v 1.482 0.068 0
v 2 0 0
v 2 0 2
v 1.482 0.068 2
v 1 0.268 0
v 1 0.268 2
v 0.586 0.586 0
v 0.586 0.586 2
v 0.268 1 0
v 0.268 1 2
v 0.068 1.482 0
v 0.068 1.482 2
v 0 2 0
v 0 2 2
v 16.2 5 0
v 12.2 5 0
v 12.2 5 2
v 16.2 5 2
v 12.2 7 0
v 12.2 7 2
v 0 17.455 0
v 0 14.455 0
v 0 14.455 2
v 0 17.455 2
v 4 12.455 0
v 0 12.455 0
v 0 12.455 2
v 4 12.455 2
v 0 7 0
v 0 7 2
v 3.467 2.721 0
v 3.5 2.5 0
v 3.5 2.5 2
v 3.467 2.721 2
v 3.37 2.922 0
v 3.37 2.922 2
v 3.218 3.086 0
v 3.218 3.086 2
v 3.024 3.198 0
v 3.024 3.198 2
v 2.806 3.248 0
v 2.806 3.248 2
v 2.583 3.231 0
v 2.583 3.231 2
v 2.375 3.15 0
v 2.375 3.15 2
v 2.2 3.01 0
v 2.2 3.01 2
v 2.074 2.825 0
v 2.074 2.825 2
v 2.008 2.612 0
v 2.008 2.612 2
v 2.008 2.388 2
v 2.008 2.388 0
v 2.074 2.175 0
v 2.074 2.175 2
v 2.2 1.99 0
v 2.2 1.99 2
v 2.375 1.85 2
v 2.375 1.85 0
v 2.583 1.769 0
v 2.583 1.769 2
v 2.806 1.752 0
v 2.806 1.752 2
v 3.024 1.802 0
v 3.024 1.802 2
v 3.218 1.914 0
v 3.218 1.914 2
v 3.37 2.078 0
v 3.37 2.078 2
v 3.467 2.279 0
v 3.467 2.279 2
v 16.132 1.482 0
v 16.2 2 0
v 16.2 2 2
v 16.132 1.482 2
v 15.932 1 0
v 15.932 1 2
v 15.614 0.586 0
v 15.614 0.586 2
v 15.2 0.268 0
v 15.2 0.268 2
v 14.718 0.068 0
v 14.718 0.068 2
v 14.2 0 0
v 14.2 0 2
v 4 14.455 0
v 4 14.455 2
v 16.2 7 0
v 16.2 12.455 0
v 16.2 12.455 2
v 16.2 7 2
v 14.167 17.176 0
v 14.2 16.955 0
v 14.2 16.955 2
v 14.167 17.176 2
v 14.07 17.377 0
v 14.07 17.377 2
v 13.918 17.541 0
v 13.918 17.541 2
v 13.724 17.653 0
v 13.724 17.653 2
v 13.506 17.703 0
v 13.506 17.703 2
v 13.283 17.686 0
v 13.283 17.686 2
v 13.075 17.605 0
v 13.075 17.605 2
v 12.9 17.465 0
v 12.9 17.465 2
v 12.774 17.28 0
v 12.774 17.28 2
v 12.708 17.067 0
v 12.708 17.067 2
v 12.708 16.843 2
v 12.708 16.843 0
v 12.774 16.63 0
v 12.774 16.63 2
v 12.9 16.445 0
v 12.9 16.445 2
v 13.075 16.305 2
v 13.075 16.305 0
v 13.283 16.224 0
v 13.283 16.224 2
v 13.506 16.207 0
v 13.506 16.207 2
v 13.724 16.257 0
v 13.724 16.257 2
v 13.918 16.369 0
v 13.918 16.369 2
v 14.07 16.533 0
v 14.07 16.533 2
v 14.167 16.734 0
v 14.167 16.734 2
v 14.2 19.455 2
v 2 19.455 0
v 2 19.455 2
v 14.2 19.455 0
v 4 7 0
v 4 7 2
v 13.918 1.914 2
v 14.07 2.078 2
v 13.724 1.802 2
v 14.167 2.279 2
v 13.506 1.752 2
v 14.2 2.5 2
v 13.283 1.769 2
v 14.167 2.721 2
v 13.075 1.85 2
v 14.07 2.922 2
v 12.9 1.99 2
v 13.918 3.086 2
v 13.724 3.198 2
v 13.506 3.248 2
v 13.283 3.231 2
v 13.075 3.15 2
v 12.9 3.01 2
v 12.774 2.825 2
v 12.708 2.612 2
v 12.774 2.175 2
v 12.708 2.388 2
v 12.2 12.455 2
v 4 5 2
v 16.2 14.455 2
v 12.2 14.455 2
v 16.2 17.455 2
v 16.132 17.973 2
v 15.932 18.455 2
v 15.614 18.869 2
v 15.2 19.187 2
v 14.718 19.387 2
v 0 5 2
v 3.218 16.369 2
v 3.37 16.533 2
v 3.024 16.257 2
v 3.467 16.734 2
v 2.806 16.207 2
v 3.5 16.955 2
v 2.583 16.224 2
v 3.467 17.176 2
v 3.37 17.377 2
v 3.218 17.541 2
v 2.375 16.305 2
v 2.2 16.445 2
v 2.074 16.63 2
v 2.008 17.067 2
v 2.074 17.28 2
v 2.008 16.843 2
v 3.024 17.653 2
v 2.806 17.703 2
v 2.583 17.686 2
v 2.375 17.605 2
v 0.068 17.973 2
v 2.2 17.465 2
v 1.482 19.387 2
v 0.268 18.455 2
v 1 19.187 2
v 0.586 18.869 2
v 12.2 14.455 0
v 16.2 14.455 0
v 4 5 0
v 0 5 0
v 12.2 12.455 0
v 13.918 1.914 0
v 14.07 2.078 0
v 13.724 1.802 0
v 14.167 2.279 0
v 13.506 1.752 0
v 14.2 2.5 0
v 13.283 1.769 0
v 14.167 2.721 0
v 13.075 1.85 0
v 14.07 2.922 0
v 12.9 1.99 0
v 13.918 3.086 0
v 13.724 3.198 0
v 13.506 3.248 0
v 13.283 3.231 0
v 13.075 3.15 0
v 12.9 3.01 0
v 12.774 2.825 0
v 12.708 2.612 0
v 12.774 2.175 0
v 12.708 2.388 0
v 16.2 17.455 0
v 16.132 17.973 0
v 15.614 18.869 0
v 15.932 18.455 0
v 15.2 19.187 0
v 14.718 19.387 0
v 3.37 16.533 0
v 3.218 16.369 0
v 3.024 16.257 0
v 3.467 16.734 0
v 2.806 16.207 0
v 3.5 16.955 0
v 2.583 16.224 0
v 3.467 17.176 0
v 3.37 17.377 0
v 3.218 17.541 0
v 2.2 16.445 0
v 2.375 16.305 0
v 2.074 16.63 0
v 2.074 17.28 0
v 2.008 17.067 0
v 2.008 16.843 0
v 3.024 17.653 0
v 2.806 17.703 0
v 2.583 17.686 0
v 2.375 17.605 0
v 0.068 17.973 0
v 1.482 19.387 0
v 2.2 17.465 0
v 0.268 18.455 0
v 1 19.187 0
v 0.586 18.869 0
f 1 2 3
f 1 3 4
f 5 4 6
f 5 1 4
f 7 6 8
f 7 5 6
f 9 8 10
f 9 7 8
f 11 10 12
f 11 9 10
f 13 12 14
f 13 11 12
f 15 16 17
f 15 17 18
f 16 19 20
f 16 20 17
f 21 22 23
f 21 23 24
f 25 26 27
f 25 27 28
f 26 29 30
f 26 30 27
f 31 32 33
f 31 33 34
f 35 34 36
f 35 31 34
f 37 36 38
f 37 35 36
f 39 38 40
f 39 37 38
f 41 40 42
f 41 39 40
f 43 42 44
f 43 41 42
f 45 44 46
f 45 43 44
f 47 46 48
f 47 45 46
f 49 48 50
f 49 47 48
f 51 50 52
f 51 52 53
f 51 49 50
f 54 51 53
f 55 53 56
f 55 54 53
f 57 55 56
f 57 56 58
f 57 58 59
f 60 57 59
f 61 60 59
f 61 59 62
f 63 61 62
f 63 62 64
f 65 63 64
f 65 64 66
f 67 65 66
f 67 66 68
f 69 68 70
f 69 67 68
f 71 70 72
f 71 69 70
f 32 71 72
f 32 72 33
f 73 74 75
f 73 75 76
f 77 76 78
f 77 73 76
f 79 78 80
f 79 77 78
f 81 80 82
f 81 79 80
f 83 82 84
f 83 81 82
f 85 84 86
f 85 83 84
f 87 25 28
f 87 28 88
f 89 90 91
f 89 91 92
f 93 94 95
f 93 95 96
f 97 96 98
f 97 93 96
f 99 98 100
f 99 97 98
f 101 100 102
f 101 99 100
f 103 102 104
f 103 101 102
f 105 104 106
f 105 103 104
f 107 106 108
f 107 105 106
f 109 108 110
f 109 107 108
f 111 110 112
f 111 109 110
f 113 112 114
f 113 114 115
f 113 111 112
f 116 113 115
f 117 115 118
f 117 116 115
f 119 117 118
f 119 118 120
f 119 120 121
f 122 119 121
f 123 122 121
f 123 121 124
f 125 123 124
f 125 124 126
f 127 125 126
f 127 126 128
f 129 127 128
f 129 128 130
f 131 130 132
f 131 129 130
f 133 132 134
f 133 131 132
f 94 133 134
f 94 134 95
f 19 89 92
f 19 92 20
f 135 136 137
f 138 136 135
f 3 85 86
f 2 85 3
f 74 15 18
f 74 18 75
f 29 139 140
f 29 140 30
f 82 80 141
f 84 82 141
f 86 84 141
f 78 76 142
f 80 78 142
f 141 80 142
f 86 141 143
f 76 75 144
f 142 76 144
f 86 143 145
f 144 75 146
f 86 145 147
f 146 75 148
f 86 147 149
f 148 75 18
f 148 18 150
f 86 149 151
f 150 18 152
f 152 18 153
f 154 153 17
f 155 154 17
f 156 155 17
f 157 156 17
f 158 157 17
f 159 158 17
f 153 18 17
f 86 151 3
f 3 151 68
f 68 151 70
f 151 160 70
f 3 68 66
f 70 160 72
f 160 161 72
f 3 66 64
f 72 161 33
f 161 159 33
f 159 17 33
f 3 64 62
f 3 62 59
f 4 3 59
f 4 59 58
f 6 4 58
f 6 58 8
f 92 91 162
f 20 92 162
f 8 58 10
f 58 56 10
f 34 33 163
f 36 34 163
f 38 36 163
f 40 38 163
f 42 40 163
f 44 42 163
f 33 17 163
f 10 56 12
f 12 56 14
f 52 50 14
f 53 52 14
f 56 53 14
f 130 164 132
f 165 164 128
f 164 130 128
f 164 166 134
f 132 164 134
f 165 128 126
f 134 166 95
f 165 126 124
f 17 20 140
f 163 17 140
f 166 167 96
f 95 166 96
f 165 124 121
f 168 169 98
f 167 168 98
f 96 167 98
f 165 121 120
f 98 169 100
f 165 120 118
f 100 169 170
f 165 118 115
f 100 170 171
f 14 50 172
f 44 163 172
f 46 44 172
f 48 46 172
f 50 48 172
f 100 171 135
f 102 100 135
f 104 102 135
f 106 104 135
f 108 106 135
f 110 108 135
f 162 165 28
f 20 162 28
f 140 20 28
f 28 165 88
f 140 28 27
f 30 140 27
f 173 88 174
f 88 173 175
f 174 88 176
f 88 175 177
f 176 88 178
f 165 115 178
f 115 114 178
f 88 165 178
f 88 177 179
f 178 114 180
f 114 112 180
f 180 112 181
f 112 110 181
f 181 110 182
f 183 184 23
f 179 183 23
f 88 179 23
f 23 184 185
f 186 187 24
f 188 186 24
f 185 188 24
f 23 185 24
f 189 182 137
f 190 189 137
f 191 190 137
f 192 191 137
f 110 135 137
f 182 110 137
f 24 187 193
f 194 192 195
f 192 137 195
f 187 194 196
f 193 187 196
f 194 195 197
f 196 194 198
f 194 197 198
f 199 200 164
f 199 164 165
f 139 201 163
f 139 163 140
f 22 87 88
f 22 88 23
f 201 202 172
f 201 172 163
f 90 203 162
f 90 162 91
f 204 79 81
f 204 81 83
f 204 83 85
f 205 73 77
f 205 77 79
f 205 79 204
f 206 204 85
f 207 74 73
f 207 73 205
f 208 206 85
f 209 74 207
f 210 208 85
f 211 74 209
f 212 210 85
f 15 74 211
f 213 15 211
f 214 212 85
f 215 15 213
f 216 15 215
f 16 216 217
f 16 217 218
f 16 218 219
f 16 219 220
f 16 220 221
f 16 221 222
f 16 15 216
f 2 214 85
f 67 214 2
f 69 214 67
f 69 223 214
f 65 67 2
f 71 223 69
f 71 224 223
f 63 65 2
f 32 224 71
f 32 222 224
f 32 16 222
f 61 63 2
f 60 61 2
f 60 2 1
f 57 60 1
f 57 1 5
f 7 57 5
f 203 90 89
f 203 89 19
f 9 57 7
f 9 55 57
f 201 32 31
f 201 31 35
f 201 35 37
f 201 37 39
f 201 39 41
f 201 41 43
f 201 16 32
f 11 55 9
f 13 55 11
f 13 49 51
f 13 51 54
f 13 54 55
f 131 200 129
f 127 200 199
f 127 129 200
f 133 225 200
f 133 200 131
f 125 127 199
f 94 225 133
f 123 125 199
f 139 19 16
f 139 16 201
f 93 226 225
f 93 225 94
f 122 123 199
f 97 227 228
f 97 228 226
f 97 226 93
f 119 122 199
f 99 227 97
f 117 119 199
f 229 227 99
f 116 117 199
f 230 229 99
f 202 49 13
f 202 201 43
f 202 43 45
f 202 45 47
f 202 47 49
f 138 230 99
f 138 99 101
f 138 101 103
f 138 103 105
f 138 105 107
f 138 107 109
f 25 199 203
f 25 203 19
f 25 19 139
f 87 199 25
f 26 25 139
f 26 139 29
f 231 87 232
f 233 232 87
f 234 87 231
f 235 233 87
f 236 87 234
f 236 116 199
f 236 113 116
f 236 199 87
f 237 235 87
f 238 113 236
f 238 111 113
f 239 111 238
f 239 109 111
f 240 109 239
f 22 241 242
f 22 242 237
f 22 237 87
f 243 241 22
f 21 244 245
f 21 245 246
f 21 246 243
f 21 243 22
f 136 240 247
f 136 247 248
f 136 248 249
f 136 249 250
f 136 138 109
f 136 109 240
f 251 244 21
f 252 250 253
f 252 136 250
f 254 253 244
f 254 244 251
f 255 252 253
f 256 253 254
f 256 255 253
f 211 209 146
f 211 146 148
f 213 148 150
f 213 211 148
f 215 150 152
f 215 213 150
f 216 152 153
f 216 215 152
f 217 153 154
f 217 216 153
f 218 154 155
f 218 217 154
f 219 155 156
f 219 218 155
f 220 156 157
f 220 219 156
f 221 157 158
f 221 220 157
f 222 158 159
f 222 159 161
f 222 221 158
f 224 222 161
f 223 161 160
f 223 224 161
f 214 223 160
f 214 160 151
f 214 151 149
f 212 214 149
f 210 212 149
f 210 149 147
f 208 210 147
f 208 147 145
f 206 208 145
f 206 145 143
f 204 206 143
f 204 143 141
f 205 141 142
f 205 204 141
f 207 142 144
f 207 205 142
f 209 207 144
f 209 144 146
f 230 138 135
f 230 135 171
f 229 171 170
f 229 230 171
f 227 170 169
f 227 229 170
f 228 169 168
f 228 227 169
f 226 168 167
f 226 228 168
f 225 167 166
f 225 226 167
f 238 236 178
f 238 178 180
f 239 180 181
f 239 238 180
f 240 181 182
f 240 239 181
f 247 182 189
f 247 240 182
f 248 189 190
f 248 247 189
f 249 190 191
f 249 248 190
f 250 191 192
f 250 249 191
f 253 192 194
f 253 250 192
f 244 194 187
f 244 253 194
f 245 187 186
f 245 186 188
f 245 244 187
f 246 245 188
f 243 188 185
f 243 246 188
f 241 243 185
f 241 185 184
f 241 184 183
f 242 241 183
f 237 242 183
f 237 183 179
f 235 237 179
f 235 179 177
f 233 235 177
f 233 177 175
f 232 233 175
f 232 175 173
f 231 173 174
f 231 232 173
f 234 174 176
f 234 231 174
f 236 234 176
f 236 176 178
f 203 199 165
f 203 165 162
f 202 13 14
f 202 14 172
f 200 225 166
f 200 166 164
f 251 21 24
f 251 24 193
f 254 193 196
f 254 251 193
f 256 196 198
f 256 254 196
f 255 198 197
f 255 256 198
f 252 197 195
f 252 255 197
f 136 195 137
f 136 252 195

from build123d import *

# Parameters (mm, degrees)
SKETCH2_R           = 0.75
BOSS_EXTRUDE1_DEPTH = 2


with BuildPart() as part:
    # Sketch2 → Boss-Extrude1 (new body)
    with BuildSketch(Plane.XY):
        with BuildLine():
            Line((0, 7), (0, 12.455))
            Line((0, 12.455), (4, 12.455))
            Line((4, 12.455), (4, 14.455))
            Line((4, 14.455), (0, 14.455))
            Line((0, 14.455), (0, 17.455))
            ThreePointArc((0, 17.455), (0.585786438, 18.869213562), (2, 19.455))
            Line((2, 19.455), (14.2, 19.455))
            ThreePointArc((14.2, 19.455), (15.614213562, 18.869213562), (16.2, 17.455))
            Line((16.2, 17.455), (16.2, 14.455))
            Line((16.2, 14.455), (12.2, 14.455))
            Line((12.2, 14.455), (12.2, 12.455))
            Line((12.2, 12.455), (16.2, 12.455))
            Line((16.2, 12.455), (16.2, 7))
            Line((16.2, 7), (12.2, 7))
            Line((12.2, 7), (12.2, 5))
            Line((12.2, 5), (16.2, 5))
            Line((16.2, 5), (16.2, 2))
            ThreePointArc((16.2, 2), (15.614213562, 0.585786438), (14.2, 0))
            Line((14.2, 0), (2, 0))
            ThreePointArc((2, 0), (0.585786438, 0.585786438), (0, 2))
            Line((0, 2), (0, 5))
            Line((0, 5), (4, 5))
            Line((4, 5), (4, 7))
            Line((4, 7), (0, 7))
        make_face()
        with Locations((13.45, 2.5)):
            Circle(SKETCH2_R, mode=Mode.SUBTRACT)
        with Locations((2.75, 16.955)):
            Circle(SKETCH2_R, mode=Mode.SUBTRACT)
        with Locations((2.75, 2.5)):
            Circle(SKETCH2_R, mode=Mode.SUBTRACT)
        with Locations((13.45, 16.955)):
            Circle(SKETCH2_R, mode=Mode.SUBTRACT)
    extrude(amount=BOSS_EXTRUDE1_DEPTH)


solid = part.part
